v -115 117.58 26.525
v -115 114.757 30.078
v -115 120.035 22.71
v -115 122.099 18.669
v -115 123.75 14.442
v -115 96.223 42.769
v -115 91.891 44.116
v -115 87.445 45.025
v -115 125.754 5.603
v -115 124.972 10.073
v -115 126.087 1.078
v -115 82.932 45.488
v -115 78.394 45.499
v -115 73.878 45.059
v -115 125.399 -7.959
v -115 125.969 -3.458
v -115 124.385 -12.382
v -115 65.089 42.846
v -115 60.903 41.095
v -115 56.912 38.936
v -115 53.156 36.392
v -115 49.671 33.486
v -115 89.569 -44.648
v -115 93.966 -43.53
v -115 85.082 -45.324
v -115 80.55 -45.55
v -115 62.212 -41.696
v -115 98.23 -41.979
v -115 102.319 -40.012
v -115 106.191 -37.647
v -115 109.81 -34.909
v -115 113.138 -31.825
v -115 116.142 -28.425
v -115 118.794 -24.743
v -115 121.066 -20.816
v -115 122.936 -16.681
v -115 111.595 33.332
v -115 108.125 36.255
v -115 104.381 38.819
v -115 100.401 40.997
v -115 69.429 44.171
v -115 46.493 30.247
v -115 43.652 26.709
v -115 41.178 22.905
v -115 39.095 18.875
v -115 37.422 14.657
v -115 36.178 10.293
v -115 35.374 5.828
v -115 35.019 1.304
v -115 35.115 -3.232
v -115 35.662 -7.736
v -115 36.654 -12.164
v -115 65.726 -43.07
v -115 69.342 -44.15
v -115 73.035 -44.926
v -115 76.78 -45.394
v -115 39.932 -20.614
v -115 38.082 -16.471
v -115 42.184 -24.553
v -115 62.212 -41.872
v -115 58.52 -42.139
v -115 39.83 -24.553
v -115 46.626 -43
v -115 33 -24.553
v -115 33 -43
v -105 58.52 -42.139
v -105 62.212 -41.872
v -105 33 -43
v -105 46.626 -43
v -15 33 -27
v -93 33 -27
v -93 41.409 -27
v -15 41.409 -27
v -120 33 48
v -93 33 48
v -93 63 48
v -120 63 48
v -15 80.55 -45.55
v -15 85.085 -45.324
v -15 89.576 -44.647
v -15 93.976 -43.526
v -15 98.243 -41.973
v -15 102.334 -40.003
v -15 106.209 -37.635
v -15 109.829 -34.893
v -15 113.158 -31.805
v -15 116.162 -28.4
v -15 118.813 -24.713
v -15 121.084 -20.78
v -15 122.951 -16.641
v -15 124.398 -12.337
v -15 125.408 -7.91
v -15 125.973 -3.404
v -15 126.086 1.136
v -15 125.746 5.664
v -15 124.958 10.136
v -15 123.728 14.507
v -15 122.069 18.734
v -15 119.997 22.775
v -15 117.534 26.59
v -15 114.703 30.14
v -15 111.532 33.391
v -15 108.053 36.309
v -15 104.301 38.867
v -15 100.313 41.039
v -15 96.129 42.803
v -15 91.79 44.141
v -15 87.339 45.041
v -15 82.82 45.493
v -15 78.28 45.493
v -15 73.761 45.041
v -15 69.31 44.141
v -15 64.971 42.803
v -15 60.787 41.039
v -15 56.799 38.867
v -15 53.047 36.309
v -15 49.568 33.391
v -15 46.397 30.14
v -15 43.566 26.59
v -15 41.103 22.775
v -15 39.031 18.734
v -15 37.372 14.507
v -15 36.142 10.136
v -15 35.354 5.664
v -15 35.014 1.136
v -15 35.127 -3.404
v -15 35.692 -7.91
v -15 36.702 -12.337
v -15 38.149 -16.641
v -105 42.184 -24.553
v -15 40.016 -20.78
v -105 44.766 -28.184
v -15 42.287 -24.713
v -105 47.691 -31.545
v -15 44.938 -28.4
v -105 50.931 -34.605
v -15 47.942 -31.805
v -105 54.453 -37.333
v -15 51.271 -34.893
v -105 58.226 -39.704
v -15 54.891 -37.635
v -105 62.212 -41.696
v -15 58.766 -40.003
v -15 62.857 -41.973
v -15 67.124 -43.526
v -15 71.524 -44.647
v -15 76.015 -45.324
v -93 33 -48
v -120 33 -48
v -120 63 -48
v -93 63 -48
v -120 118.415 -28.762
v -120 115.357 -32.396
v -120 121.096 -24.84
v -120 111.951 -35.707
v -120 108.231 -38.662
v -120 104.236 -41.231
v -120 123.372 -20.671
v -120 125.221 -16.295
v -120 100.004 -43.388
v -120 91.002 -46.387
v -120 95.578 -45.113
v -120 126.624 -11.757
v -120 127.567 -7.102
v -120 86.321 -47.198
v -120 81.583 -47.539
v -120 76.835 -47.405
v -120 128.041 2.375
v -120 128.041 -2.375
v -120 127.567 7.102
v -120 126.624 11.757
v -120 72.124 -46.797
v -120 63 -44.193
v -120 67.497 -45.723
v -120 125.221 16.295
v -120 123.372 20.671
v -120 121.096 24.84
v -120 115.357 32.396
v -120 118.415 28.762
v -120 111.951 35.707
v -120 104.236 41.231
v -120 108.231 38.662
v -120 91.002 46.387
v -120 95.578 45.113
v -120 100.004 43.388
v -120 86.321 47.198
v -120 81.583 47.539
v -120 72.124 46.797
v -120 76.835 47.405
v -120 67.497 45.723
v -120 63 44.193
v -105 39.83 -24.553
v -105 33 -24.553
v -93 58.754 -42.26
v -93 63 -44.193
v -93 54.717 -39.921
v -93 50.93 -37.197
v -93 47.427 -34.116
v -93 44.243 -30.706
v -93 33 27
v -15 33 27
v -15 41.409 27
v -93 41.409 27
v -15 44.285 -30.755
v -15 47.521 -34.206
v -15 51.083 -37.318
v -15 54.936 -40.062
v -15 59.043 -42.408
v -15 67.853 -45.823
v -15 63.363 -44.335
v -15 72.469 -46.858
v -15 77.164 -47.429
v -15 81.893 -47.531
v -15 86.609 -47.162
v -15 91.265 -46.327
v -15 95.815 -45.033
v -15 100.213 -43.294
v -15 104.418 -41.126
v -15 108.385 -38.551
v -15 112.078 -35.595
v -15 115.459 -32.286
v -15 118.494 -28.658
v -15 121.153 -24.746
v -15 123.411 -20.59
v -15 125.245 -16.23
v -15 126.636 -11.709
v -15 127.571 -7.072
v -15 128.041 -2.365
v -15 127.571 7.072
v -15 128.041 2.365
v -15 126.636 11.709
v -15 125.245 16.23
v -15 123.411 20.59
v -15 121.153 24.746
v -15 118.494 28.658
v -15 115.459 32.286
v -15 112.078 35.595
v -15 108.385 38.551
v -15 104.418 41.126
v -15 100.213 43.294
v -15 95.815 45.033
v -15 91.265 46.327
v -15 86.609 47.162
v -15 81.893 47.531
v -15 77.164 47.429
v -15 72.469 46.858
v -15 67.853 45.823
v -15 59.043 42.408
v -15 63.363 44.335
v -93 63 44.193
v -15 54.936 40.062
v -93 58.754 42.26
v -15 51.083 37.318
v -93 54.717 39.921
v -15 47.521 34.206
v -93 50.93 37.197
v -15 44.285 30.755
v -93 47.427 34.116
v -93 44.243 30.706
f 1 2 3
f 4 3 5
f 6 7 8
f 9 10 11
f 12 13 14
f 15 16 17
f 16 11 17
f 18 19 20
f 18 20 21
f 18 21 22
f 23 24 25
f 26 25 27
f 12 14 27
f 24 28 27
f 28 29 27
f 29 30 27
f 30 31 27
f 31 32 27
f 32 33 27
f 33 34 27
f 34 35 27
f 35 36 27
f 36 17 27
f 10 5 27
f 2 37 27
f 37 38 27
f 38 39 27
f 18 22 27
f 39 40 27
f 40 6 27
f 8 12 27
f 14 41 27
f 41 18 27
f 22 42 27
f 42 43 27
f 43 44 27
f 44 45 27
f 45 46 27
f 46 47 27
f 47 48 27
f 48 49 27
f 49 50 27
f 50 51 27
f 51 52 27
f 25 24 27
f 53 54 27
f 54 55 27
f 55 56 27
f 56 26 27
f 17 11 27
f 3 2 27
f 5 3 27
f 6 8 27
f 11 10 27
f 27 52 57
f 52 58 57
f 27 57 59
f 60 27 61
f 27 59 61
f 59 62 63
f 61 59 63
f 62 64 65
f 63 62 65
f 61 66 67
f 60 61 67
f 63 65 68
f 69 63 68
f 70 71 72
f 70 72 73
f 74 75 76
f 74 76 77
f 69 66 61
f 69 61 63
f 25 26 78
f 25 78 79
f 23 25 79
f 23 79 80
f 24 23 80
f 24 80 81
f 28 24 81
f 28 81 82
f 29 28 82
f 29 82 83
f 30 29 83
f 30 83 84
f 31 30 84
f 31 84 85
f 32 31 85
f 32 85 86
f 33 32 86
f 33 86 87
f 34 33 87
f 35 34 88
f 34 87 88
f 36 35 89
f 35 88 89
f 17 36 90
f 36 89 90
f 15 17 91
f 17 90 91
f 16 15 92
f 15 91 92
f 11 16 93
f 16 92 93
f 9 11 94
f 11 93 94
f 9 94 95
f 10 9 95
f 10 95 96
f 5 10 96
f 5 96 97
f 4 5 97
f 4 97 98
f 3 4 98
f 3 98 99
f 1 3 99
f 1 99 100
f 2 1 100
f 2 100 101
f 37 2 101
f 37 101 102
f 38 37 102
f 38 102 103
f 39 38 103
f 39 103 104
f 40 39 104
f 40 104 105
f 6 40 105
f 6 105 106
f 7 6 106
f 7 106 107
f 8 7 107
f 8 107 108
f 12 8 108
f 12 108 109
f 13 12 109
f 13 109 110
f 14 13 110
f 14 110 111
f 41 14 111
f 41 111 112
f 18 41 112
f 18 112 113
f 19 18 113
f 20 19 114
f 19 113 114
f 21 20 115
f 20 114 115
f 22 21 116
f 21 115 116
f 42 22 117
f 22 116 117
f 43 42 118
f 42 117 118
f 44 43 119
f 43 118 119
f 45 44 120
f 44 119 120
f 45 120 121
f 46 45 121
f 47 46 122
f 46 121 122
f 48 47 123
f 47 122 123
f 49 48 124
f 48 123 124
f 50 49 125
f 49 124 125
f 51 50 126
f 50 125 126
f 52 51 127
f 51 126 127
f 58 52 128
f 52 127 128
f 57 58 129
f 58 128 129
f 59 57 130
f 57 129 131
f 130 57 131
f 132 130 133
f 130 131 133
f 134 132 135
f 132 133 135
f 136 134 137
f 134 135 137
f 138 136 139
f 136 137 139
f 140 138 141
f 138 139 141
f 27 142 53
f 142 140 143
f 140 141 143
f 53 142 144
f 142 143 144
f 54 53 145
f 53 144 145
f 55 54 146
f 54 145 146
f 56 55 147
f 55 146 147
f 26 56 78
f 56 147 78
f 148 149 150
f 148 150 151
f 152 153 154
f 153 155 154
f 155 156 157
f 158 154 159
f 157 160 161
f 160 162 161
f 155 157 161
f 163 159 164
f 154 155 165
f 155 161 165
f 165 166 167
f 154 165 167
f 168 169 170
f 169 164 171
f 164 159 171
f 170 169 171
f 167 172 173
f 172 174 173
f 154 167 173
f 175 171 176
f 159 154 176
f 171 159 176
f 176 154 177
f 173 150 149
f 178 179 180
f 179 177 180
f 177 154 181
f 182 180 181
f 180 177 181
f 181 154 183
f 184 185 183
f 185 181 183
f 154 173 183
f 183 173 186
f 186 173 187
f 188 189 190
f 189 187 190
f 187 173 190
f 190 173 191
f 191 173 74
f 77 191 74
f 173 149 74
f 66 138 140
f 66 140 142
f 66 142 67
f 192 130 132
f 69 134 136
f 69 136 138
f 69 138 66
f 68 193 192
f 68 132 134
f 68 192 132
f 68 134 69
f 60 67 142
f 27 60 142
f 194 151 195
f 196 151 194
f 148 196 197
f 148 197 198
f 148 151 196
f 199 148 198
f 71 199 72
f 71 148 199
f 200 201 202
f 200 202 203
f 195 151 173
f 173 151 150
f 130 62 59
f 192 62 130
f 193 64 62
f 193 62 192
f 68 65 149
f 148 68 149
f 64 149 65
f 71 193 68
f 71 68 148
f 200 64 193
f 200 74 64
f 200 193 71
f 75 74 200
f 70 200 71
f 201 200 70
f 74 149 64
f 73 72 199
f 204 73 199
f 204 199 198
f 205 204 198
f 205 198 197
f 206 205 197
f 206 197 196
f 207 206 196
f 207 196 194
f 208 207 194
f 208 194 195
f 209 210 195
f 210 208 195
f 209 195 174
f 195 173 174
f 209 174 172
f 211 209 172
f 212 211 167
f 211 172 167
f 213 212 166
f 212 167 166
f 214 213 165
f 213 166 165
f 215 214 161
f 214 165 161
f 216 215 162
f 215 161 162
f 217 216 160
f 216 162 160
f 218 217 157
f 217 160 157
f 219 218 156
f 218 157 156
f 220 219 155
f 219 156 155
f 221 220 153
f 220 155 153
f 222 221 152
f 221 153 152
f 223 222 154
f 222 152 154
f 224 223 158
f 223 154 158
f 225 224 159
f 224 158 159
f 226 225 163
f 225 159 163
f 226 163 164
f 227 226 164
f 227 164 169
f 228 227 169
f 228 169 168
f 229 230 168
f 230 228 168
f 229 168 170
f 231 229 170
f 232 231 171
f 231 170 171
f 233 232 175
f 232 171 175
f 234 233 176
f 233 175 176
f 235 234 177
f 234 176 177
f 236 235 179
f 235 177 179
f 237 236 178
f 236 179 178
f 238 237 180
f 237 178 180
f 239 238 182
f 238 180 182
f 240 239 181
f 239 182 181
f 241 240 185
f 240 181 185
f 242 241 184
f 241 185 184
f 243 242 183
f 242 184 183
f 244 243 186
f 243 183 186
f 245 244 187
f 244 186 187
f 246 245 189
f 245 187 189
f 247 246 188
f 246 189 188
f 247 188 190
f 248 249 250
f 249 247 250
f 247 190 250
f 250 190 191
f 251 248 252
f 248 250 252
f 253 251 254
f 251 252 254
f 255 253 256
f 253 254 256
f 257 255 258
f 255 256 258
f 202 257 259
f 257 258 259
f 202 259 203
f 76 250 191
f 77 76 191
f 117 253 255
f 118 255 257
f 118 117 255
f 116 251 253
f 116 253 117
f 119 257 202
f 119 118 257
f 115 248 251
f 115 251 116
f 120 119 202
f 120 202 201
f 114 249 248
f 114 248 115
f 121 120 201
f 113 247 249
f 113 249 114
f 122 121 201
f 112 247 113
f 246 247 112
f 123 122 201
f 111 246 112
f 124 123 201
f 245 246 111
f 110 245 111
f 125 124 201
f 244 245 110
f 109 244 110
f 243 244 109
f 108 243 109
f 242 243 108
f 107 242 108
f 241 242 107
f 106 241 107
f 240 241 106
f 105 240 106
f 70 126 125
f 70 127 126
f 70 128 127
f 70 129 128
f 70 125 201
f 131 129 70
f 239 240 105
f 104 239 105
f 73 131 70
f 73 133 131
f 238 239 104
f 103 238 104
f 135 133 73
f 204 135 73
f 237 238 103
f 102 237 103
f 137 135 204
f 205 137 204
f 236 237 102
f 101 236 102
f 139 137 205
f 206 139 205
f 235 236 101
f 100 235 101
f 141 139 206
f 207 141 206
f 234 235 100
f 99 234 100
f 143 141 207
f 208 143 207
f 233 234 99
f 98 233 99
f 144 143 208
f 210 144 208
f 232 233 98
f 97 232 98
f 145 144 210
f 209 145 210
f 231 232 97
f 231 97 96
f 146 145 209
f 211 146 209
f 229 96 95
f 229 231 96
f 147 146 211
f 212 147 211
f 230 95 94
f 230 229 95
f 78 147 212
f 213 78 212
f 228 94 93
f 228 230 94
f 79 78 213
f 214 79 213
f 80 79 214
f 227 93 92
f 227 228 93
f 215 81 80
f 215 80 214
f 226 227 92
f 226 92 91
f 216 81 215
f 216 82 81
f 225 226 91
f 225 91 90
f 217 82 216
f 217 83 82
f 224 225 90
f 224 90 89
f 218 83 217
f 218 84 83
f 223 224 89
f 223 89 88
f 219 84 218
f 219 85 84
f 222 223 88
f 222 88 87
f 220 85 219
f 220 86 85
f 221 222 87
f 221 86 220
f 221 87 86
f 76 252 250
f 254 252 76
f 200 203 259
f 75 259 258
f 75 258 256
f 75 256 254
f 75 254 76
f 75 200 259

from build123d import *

# Parameters (mm, degrees)
SKETCH2_W                = 10
SKETCH2_H                = 86
BOSS_EXTRUDE1_DEPTH      = 10
SKETCH3_W                = 10
SKETCH3_H                = 86
BOSS_EXTRUDE2_DEPTH      = 23
BOSS_EXTRUDE3_REACH      = 246.16
BOSS_EXTRUDE4_DEPTH      = 100
BOSS_EXTRUDE4_DEPTH_BACK = 5
SKETCH5_R                = 47.55
SKETCH7_W                = 10
SKETCH7_H                = 18.447060317
BOSS_EXTRUDE6_DEPTH      = 30
CUT_EXTRUDE2_DEPTH       = 10
BOSS_EXTRUDE7_REACH      = 275.742
SKETCH6_R                = 45.55
CUT_EXTRUDE1_DEPTH       = 100
SKETCH10_W               = 15
SKETCH10_H               = 10
SKETCH10_W_2             = 10
SKETCH10_H_2             = 15
BOSS_EXTRUDE8_DEPTH      = 28.5
FILLET1_R                = 30
FILLET2_R                = 30
FILLET3_R                = 30
SKETCH11_W               = 250
SKETCH11_H               = 33
CUT_EXTRUDE3_DEPTH       = 234.52646531


with BuildPart() as part:
    # Sketch2 → Boss-Extrude1 (new body)
    with BuildSketch(Plane(origin=(0, 0, 0), x_dir=(1, 0, 0), z_dir=(0, 1, 0))):
        Polygon((-125, -75), (-115, -75), (-115, -48), (-47, -48), (-47, -75), (47, -75), (47, -48), (115, -48), (115, -75), (125, -75), (125, 75), (115, 75), (115, 48), (47, 48), (47, 75), (-47, 75), (-47, 48), (-115, 48), (-115, 75), (-125, 75), align=None)
        with Locations((-110, 0)):
            Rectangle(SKETCH2_W, SKETCH2_H, mode=Mode.SUBTRACT)
    extrude(amount=BOSS_EXTRUDE1_DEPTH)

    # Sketch3 → Boss-Extrude2 (add)
    with BuildSketch(Plane(origin=(0, 10, 0), x_dir=(1, 0, 0), z_dir=(0, 1, 0))):
        Polygon((-47, 48), (-47, 75), (47, 75), (47, 48), (26, 48), (26, 27), (93, 27), (93, 48), (115, 48), (115, 75), (125, 75), (125, -75), (115, -75), (115, -48), (93, -48), (93, -27), (26, -27), (26, -48), (47, -48), (47, -75), (-47, -75), (-47, -48), (-26, -48), (-26, -27), (-93, -27), (-93, -48), (-115, -48), (-115, -75), (-125, -75), (-125, 75), (-115, 75), (-115, 48), (-93, 48), (-93, 27), (-26, 27), (-26, 48), align=None)
        with Locations((-110, 0)):
            Rectangle(SKETCH3_W, SKETCH3_H, mode=Mode.SUBTRACT)
    extrude(amount=BOSS_EXTRUDE2_DEPTH)

    # Sketch4 → Boss-Extrude3 (add, up to next)
    with BuildSketch(Plane.ZY.offset(105), mode=Mode.PRIVATE) as boss_extrude3_sk1:
        Polygon((-43, 0), (-9.223530158, 14.703891082), (-43, 33), align=None)
    boss_extrude3_tool1 = extrude(boss_extrude3_sk1.sketch, amount=BOSS_EXTRUDE3_REACH, mode=Mode.PRIVATE) - part.part
    # Sketch4 → Boss-Extrude3 (add, up to next)
    with BuildSketch(Plane.ZY.offset(105), mode=Mode.PRIVATE) as boss_extrude3_sk2:
        Polygon((43, 0), (9.223530158, 14.703891082), (-24.552939683, 33), (43, 33), align=None)
    boss_extrude3_tool2 = extrude(boss_extrude3_sk2.sketch, amount=BOSS_EXTRUDE3_REACH, mode=Mode.PRIVATE) - part.part
    add(boss_extrude3_tool1.solids().sort_by_distance((-105, 15.901297, -31.741177))[0])
    add(boss_extrude3_tool2.solids().sort_by_distance((-105, 21.685197, 19.901194))[0])



with BuildPart() as body_2:
    # Sketch5 → Boss-Extrude4 (new, two sides: drawn at the far end of the back side and taken through both)
    with BuildSketch(Plane(origin=(-115, 0, 0), x_dir=(0, 0, -1), z_dir=(1, 0, 0)).offset(-BOSS_EXTRUDE4_DEPTH_BACK)):
        with Locations((0, 80.55)):
            Circle(SKETCH5_R)
    extrude(amount=BOSS_EXTRUDE4_DEPTH + BOSS_EXTRUDE4_DEPTH_BACK)


with BuildPart() as part_1:
    add(part.part)

    add(body_2.part)  # Boss-Extrude6 merges body 2
    # Sketch7 → Boss-Extrude6 (add)
    with BuildSketch(Plane(origin=(0, 33, 0), x_dir=(1, 0, 0), z_dir=(0, 1, 0))):
        Polygon((-120, 0), (-120, 48), (-93, 48), (-93, 27), (-15, 27), (-15, -27), (-93, -27), (-93, -48), (-120, -48), align=None)
        with Locations((-110, 33.776469842)):
            Rectangle(SKETCH7_W, SKETCH7_H, mode=Mode.SUBTRACT)
    extrude(amount=BOSS_EXTRUDE6_DEPTH)

    # Sketch8 → Cut-Extrude2 (cut)
    with BuildSketch(Plane.ZY.offset(105)):
        Polygon((-43, 46.626077643), (-41.871641374, 62.212018017), (-24.552939683, 62.212018017), (-24.552939683, 33), (-43, 33), align=None)
    extrude(amount=CUT_EXTRUDE2_DEPTH, mode=Mode.SUBTRACT)

    # Sketch9 → Boss-Extrude7 (add, up to next)
    with BuildSketch(Plane.ZY.offset(105), mode=Mode.PRIVATE) as boss_extrude7_sk1:
        Polygon((-42.138917347, 58.520153318), (-43, 46.626077643), (-43, 62.212018017), (-41.871641374, 62.212018017), align=None)
    boss_extrude7_tool1 = extrude(boss_extrude7_sk1.sketch, amount=BOSS_EXTRUDE7_REACH, mode=Mode.PRIVATE) - part_1.part
    add(boss_extrude7_tool1.solids().sort_by_distance((-105, 57.016705, -42.62388))[0])

    # Sketch6 → Cut-Extrude1 (cut)
    with BuildSketch(Plane(origin=(-15, 0, 0), x_dir=(0, 0, -1), z_dir=(1, 0, 0))):
        with Locations((0, 80.55)):
            Circle(SKETCH6_R)
    extrude(amount=-CUT_EXTRUDE1_DEPTH, mode=Mode.SUBTRACT)

    # Sketch10 → Boss-Extrude8 (add)
    with BuildSketch(Plane(origin=(0, 33, 0), x_dir=(1, 0, 0), z_dir=(0, 1, 0))):
        with Locations((12.5, 39)):
            Rectangle(SKETCH10_W, SKETCH10_H)
        with Locations((12.5, -39)):
            Rectangle(SKETCH10_W, SKETCH10_H)
        with Locations((63, 0)):
            Rectangle(SKETCH10_W_2, SKETCH10_H_2)
    extrude(amount=BOSS_EXTRUDE8_DEPTH)

    # Fillet1
    # the kernel refuses this fillet: 30 mm, written as the material it adds along each edge
    with BuildSketch(Plane(origin=(5, 33, 44), x_dir=(0, 0, 1), z_dir=(1, 0, 0))) as fillet1_piece_1:
        with BuildLine():
            CenterArc((29.962476533, -30), FILLET1_R, 90, 87.134016017)
            Line((0, -28.5), (0, 0))
            Line((0, 0), (29.962476533, 0))
        make_face()
    extrude(amount=15)

    # Fillet2
    # the kernel refuses this fillet: 30 mm, written as the material it adds along each edge
    with BuildSketch(Plane(origin=(20, 33, -44), x_dir=(0, 0, -1), z_dir=(-1, 0, 0))) as fillet2_piece_1:
        with BuildLine():
            CenterArc((29.962476533, -30), FILLET2_R, 90, 87.134016017)
            Line((0, -28.5), (0, 0))
            Line((0, 0), (29.962476533, 0))
        make_face()
    extrude(amount=15)

    # Fillet3
    # the kernel refuses this fillet: 30 mm, written as the material it adds along each edge
    with BuildSketch(Plane(origin=(68, 33, 7.5), x_dir=(1, 0, 0), z_dir=(0, 0, -1))) as fillet3_piece_1:
        with BuildLine():
            CenterArc((29.962476533, -30), FILLET3_R, 90, 87.134016017)
            Line((0, -28.5), (0, 0))
            Line((0, 0), (29.962476533, 0))
        make_face()
    extrude(amount=15)

    # Sketch11 → Cut-Extrude3 (cut, through all)
    with BuildSketch(Plane.XY.offset(75)):
        with Locations((0, 16.5)):
            Rectangle(SKETCH11_W, SKETCH11_H)
    extrude(amount=-CUT_EXTRUDE3_DEPTH, mode=Mode.SUBTRACT)


with BuildPart() as cut_extrude3_piece_1:
    # of the separate pieces the step leaves, piece 1, a body of its own (cut_extrude3_pieces)
    add(part_1.part.solids().sort_by_distance((-93, 33, 27))[0])


with BuildPart() as cut_extrude3_piece_2:
    # of the separate pieces the step leaves, piece 2, a body of its own (cut_extrude3_pieces)
    add(part_1.part.solids().sort_by_distance((97.962476533, 33, 7.5))[0])


with BuildPart() as cut_extrude3_piece_3:
    # of the separate pieces the step leaves, piece 3, a body of its own (cut_extrude3_pieces)
    add(part_1.part.solids().sort_by_distance((20, 33, 34))[0])


with BuildPart() as cut_extrude3_piece_4:
    # of the separate pieces the step leaves, piece 4, a body of its own (cut_extrude3_pieces)
    add(part_1.part.solids().sort_by_distance((20, 33, -73.962476533))[0])


solid = cut_extrude3_piece_1.part
